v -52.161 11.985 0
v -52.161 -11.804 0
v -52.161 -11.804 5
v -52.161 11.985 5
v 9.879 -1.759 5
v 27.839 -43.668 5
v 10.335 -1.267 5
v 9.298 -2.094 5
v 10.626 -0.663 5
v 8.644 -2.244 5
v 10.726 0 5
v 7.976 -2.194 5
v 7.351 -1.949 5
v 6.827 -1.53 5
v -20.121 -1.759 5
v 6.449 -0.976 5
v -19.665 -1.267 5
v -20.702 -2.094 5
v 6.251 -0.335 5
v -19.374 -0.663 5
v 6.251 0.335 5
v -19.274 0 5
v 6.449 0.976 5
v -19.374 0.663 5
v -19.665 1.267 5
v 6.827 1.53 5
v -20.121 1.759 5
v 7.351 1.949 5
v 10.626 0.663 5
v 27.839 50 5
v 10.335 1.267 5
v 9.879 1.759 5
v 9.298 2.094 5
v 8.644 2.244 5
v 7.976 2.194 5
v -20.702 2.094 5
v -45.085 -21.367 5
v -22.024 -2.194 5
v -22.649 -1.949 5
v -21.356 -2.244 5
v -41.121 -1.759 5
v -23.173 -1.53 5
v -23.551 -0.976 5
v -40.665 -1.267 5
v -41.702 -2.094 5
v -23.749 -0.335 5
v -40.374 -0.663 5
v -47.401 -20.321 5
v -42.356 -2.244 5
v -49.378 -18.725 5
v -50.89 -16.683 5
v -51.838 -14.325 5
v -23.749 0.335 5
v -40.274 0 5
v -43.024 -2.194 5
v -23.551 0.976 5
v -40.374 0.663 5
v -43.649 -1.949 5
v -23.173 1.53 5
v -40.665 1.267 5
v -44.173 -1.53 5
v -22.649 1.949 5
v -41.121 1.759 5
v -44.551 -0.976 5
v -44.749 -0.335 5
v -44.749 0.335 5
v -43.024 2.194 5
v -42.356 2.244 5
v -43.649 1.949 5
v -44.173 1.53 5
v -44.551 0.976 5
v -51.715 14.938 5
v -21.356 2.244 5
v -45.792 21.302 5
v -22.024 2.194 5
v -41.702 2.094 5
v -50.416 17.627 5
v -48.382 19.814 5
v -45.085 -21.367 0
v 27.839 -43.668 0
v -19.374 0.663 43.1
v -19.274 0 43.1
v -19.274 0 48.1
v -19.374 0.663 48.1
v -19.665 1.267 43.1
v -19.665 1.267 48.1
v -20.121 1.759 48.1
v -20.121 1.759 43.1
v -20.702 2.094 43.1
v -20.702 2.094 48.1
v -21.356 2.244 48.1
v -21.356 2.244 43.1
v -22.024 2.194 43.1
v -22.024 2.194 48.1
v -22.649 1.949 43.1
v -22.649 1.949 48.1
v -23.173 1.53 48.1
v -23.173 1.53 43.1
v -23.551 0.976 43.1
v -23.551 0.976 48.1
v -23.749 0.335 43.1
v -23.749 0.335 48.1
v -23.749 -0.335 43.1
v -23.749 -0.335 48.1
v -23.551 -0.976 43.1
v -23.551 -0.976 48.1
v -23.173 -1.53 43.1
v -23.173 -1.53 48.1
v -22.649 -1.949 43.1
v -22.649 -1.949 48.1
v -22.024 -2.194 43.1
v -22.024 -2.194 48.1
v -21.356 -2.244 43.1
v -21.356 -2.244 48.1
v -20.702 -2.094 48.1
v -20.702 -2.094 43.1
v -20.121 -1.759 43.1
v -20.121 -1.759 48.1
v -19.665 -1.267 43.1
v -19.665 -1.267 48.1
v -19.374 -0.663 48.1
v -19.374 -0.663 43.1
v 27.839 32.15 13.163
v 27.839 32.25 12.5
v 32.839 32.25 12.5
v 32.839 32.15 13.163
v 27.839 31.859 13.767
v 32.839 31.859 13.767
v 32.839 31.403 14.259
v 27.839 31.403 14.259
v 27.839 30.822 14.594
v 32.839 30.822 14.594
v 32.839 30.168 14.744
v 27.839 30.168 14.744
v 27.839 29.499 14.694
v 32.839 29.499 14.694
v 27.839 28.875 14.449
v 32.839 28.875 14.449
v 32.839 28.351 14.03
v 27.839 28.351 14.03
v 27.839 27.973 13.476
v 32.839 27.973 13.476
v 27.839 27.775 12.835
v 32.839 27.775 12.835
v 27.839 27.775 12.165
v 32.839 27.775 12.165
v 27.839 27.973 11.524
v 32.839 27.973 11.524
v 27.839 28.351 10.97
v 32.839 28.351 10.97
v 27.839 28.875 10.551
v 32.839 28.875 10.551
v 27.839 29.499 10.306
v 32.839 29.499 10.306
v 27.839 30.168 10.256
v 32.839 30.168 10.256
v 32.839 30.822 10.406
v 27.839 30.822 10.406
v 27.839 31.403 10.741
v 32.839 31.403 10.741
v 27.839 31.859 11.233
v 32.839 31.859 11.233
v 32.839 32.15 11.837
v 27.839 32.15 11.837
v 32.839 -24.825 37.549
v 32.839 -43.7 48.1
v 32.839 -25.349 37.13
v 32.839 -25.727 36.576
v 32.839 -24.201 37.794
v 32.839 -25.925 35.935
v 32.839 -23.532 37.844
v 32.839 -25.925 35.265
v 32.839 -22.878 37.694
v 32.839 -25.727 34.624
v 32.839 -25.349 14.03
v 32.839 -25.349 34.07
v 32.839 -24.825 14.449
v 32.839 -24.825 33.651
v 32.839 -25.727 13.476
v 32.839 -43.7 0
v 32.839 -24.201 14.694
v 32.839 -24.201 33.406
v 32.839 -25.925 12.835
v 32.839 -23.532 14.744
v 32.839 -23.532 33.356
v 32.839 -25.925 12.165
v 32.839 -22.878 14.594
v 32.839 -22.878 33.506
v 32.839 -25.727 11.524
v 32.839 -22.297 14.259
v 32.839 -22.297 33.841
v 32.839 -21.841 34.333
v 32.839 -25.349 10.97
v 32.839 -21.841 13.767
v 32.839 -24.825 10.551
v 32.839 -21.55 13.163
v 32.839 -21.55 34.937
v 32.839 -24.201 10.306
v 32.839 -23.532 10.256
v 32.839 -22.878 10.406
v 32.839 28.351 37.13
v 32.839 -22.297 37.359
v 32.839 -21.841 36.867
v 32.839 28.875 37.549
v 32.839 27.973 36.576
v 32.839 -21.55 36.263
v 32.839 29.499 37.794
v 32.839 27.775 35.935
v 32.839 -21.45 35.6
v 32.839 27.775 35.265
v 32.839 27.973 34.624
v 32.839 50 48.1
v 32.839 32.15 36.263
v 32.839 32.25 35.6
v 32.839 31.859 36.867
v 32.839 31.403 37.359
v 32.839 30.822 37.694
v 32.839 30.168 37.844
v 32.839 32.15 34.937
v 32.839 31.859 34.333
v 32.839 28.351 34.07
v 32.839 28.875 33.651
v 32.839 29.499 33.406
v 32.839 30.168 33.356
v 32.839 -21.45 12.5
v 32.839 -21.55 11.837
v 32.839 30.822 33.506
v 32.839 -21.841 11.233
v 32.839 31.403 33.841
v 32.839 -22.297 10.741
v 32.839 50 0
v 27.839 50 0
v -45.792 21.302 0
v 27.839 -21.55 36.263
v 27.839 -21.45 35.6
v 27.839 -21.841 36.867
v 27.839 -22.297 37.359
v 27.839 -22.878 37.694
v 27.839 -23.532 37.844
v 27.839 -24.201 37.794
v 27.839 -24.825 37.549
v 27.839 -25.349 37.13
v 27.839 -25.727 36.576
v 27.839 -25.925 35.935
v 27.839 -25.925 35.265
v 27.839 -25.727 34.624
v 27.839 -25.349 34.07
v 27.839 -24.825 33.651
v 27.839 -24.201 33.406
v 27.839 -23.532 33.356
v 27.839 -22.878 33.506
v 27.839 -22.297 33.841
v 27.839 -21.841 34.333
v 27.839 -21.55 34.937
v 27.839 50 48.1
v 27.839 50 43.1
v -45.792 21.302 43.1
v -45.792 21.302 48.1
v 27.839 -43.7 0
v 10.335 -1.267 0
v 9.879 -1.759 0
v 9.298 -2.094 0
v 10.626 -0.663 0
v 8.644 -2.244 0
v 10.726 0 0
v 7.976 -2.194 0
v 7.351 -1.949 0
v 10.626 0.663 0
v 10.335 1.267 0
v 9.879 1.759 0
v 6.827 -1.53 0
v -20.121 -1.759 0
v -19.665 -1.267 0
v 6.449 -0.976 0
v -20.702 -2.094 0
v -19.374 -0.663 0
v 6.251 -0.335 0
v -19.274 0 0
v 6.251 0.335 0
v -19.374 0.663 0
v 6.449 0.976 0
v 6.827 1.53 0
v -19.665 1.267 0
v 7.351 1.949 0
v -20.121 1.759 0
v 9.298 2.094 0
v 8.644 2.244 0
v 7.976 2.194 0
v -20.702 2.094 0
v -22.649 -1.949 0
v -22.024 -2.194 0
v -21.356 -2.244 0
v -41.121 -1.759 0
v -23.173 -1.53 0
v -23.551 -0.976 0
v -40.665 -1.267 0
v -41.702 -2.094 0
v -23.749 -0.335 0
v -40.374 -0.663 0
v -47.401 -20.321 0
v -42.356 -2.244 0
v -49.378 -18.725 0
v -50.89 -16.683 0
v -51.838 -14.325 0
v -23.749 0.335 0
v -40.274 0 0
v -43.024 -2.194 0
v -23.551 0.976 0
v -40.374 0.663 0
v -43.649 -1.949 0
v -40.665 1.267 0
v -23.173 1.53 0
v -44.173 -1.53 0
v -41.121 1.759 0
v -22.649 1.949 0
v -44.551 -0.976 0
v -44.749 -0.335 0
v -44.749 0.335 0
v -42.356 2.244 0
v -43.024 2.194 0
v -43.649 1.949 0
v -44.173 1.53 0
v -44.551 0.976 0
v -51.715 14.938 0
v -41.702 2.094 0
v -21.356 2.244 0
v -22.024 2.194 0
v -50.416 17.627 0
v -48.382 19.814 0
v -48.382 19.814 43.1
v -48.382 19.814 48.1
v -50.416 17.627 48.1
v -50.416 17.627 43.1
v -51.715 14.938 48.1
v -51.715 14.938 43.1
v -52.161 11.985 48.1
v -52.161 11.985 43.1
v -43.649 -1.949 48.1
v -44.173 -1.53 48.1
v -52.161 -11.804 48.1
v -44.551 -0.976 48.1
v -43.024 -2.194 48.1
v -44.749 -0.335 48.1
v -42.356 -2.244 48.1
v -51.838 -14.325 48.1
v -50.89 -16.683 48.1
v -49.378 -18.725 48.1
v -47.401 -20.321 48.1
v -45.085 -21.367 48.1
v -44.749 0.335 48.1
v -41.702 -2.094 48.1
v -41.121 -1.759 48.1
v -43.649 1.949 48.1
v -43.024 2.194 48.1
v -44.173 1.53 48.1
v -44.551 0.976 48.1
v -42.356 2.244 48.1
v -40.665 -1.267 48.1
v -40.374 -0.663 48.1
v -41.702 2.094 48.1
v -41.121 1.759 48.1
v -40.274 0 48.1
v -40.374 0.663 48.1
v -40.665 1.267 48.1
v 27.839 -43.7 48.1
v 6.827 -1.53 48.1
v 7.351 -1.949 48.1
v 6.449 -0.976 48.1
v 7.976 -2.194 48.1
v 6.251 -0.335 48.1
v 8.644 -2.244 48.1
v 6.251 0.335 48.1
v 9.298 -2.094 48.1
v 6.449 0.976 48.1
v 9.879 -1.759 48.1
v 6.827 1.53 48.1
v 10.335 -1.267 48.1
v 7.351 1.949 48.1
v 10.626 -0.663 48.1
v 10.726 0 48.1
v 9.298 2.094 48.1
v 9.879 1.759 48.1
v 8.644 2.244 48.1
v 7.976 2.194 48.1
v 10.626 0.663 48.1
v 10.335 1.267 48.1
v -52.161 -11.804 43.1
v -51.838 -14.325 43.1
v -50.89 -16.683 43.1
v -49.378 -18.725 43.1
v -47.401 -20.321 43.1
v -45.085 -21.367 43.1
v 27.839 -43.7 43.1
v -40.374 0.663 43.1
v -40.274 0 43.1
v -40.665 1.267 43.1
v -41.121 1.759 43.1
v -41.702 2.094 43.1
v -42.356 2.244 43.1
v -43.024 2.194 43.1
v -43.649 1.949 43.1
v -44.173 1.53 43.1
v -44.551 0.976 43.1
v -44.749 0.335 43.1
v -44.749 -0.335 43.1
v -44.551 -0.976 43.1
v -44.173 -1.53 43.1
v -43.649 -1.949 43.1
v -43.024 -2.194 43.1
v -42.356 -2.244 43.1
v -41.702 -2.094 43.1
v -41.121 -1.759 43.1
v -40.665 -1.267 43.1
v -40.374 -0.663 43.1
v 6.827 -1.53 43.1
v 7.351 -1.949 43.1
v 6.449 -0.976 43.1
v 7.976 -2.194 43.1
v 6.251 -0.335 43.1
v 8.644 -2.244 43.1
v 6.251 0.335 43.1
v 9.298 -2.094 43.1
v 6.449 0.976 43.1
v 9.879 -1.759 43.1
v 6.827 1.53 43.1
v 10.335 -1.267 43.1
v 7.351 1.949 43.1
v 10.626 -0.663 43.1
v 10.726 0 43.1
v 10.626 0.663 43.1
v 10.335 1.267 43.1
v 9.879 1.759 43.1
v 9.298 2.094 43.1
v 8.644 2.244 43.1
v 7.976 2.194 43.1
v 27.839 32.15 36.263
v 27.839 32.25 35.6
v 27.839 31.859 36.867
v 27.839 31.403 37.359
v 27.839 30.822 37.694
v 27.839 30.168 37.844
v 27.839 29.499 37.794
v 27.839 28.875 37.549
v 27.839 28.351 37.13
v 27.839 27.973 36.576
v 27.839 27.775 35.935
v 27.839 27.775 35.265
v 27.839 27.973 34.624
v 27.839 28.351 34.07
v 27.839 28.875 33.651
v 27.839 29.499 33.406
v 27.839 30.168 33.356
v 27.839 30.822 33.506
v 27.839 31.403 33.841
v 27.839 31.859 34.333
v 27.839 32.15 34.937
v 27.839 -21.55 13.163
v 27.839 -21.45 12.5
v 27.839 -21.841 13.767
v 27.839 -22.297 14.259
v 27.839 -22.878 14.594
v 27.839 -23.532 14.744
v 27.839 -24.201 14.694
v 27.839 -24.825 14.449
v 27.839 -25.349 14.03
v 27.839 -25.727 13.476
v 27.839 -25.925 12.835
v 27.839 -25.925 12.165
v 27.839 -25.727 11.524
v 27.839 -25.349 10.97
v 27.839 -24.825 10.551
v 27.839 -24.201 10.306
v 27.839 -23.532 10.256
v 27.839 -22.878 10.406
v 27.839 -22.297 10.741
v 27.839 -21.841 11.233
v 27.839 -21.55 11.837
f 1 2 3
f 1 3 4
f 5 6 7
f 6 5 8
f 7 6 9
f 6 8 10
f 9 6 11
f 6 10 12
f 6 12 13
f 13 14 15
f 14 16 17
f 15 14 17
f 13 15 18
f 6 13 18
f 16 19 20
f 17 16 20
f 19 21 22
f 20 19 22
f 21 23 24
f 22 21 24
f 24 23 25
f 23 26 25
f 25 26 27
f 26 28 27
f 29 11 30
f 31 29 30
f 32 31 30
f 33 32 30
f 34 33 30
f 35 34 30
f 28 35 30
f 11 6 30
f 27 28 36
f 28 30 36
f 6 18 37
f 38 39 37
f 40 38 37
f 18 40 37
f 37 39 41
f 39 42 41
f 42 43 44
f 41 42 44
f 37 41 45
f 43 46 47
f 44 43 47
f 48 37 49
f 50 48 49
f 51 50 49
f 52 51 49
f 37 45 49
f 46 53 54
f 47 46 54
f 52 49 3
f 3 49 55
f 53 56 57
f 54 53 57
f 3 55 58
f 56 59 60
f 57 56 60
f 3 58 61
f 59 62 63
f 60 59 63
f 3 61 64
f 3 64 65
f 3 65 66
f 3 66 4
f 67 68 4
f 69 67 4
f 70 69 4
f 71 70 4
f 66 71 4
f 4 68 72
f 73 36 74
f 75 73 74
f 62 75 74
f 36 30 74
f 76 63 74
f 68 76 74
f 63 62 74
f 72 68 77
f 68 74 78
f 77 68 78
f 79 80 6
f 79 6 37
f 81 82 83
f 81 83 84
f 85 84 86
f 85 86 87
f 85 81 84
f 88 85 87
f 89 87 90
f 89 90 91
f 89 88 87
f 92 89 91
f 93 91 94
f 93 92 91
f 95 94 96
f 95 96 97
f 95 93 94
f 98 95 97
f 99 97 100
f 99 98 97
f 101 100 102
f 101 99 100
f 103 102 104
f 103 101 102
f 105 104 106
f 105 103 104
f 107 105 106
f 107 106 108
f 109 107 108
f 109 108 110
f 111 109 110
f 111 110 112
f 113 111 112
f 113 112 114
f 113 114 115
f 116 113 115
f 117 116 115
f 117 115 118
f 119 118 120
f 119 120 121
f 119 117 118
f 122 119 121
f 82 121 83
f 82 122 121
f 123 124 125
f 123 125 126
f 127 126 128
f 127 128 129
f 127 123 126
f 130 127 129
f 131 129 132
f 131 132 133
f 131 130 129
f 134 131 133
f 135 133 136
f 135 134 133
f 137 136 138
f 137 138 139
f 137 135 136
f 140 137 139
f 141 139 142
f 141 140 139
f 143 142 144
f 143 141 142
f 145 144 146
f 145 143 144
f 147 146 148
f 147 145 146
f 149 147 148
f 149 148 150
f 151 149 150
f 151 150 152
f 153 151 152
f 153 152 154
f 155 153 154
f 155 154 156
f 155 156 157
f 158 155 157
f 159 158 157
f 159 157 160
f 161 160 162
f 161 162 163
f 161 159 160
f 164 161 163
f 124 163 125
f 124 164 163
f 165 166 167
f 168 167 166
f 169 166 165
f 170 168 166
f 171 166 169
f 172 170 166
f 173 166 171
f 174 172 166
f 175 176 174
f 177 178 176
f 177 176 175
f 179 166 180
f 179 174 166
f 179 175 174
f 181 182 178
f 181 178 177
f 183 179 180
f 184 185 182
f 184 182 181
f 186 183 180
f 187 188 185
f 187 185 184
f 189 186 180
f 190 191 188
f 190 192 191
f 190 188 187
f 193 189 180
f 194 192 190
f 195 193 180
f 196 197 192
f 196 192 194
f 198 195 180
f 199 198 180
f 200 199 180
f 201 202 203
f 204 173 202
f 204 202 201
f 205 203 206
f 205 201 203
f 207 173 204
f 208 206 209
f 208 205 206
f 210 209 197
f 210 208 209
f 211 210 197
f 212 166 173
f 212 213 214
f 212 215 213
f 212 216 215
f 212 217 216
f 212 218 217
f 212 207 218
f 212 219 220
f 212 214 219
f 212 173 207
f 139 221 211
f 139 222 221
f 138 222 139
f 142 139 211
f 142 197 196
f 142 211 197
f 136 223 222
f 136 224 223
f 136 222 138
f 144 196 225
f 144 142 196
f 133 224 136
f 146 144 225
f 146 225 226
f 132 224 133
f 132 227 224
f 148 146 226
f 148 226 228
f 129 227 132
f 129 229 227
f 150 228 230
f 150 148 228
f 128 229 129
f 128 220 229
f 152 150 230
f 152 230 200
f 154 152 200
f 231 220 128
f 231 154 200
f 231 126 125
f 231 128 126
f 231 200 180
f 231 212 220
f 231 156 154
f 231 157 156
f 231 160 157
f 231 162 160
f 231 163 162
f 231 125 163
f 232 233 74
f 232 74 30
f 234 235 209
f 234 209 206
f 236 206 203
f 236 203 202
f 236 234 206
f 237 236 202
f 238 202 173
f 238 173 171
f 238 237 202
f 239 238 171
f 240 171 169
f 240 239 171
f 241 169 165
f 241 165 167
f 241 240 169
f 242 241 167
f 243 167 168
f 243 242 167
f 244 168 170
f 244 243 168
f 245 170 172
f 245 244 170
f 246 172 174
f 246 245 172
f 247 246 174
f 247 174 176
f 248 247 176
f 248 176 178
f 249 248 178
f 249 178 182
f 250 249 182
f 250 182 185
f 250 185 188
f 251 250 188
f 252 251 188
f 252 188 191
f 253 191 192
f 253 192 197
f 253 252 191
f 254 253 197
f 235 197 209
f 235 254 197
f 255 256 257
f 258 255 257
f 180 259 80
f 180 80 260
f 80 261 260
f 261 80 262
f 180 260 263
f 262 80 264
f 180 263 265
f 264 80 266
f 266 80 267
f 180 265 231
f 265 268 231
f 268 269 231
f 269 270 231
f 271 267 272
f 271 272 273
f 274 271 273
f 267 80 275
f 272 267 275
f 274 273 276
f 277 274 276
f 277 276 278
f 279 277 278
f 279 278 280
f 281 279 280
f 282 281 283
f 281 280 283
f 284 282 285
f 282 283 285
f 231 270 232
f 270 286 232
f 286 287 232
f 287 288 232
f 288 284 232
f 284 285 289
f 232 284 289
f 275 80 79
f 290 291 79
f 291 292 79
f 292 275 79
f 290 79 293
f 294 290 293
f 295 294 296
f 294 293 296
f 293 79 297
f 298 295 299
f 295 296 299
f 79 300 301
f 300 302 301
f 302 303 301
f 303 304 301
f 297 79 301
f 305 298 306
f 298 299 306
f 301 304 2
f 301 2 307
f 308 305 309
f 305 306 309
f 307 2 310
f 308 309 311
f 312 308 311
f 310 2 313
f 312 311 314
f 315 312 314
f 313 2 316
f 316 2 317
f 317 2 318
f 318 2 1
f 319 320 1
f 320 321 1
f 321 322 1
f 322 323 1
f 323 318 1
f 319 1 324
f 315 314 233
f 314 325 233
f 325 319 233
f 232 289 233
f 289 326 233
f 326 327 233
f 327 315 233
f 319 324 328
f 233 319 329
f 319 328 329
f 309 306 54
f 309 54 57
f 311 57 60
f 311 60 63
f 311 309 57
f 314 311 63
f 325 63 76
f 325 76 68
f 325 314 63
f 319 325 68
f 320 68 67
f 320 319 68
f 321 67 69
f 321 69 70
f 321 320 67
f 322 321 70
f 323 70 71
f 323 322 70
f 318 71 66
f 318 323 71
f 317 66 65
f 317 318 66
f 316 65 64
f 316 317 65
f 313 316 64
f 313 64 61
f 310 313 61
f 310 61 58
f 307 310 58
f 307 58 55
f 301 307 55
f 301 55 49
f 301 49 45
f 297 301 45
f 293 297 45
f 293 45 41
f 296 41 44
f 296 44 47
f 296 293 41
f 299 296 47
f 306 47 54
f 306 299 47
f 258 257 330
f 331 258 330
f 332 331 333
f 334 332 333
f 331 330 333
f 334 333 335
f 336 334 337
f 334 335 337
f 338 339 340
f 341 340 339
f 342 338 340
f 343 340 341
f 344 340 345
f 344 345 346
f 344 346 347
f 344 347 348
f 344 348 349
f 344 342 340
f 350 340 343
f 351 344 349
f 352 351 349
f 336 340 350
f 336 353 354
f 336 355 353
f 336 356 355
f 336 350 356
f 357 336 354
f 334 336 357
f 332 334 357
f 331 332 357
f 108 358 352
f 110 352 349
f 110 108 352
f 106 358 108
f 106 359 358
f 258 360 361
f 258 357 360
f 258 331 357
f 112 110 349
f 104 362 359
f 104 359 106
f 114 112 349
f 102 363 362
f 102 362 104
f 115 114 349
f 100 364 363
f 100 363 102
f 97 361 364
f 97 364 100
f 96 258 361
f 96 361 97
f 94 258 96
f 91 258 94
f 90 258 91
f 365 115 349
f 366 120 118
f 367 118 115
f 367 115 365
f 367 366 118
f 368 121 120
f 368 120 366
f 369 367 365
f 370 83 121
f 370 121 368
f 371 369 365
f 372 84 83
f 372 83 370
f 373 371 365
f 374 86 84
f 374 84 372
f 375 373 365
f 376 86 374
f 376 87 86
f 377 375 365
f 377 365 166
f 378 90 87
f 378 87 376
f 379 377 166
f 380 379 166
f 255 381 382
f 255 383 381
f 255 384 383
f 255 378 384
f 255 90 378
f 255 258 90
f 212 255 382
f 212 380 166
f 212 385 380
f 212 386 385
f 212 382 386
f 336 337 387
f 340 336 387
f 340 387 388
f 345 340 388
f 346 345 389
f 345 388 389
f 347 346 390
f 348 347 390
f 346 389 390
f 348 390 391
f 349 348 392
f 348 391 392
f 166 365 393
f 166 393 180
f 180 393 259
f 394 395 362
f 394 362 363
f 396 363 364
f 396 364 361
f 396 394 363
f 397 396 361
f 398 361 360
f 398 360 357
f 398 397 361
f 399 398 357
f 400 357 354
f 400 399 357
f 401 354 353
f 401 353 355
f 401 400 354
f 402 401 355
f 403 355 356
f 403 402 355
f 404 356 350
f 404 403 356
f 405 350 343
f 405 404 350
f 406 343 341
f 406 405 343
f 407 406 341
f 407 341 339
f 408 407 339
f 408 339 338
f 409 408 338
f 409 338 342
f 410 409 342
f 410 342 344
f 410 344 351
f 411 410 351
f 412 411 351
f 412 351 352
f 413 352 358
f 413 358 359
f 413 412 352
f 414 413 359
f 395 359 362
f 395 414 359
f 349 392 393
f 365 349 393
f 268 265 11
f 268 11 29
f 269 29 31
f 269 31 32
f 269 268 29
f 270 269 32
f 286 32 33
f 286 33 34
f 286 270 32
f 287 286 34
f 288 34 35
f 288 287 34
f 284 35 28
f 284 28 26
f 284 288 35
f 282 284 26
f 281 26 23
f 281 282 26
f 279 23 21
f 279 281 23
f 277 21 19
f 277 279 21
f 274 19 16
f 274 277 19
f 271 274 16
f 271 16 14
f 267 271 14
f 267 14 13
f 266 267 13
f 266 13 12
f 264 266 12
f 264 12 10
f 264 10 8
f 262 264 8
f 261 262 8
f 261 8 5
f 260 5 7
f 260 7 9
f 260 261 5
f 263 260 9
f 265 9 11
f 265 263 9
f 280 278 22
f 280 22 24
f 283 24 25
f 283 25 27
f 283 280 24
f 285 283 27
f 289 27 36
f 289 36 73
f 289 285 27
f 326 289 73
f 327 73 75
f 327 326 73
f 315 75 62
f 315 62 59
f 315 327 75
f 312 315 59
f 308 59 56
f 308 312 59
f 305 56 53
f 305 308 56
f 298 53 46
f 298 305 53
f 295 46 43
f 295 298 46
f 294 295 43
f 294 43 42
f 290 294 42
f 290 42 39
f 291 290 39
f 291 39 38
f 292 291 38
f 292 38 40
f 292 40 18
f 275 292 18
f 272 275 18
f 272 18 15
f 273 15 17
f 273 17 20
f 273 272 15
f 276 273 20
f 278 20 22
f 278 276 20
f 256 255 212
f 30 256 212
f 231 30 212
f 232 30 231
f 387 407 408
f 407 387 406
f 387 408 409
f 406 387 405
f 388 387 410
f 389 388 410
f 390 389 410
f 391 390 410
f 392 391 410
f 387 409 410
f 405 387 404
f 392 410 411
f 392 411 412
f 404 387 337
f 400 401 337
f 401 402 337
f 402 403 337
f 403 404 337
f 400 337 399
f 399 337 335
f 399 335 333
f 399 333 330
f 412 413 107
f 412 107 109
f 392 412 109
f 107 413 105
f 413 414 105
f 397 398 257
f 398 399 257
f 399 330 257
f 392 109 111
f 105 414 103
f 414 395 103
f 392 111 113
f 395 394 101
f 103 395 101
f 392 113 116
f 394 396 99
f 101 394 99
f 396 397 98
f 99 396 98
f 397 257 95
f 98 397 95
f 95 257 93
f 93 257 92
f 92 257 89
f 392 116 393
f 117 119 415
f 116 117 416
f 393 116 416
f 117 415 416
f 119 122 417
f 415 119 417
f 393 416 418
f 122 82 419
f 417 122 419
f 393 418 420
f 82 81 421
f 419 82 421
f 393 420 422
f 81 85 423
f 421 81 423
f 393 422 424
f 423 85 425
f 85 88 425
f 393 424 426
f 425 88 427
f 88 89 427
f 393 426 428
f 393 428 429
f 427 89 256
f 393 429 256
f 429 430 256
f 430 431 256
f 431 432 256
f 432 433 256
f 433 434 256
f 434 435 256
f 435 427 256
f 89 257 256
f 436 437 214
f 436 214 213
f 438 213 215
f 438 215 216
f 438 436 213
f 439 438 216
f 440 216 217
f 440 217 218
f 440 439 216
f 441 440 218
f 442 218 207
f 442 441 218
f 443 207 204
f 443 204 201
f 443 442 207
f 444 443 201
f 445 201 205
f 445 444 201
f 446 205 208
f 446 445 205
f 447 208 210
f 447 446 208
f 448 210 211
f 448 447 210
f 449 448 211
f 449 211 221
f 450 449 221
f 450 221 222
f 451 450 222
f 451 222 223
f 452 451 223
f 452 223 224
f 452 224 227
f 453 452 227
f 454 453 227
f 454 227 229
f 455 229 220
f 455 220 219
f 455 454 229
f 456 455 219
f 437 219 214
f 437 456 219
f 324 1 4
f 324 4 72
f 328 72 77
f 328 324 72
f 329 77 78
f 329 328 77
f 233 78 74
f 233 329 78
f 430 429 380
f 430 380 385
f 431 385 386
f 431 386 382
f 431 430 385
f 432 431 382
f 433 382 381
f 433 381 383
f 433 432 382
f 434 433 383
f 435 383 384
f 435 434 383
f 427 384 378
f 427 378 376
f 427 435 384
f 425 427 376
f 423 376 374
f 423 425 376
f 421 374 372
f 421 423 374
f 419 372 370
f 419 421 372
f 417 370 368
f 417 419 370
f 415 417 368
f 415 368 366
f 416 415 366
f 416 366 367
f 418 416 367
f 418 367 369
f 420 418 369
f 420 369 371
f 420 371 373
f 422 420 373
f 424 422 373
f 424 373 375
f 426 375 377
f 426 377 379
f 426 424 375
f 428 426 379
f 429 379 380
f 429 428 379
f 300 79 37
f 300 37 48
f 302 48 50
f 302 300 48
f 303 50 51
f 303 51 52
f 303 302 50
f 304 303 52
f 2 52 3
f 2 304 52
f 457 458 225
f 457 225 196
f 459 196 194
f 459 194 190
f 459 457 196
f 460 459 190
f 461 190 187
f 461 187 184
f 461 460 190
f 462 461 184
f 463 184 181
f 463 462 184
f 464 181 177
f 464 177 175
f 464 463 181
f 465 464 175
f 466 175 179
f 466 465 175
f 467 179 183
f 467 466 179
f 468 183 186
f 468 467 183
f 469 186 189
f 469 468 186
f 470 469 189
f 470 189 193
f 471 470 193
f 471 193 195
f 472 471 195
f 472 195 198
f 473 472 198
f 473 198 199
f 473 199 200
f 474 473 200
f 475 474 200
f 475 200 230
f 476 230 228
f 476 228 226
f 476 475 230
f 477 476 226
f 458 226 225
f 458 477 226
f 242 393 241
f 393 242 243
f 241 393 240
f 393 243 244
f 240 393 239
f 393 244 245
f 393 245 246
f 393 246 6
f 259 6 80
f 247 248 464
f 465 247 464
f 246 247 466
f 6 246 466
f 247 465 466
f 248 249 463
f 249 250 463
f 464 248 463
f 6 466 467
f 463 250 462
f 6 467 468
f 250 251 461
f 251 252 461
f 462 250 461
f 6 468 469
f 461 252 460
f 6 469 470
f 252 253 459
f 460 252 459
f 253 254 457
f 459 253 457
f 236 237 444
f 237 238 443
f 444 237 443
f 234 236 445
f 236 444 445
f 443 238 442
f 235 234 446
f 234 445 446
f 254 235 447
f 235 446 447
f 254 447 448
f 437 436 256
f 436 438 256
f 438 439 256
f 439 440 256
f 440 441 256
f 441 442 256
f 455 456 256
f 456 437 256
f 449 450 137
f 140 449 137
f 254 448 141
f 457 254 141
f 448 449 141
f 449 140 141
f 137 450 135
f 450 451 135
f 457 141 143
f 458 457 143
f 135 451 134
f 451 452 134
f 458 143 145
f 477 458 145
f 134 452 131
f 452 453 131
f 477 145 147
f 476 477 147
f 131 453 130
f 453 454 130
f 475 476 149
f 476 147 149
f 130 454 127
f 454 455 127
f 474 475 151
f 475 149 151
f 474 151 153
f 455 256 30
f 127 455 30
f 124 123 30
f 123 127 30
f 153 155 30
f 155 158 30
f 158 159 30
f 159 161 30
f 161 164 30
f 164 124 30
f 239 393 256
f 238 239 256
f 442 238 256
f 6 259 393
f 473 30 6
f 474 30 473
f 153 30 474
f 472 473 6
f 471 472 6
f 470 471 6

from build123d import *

# Parameters (mm, degrees)
SKETCH1_R           = 2.25
BOSS_EXTRUDE1_DEPTH = 5
SKETCH2_W           = 48.1
SKETCH2_H           = 93.7
SKETCH2_R           = 2.25
BOSS_EXTRUDE2_DEPTH = 5
BOSS_EXTRUDE3_START = -5
SKETCH3_R           = 2.25
BOSS_EXTRUDE3_DEPTH = 5


with BuildPart() as part:
    # Sketch1 → Boss-Extrude1 (new body)
    with BuildSketch(Plane.XY):
        with BuildLine():
            Line((-52.1605695, -11.804270746), (-52.1605695, 11.984503151))
            ThreePointArc((-52.1605695, 11.984503151), (-50.416314539, 17.627434468), (-45.792034729, 21.301823597))
            Line((-45.792034729, 21.301823597), (27.8394305, 50))
            Line((27.8394305, 50), (27.8394305, -43.667964744))
            Line((27.8394305, -43.667964744), (-45.084961564, -21.367111906))
            ThreePointArc((-45.084961564, -21.367111906), (-50.199348034, -17.752214901), (-52.1605695, -11.804270746))
        make_face()
        with Locations((-42.523814383, 0)):
            Circle(SKETCH1_R, mode=Mode.SUBTRACT)
        with Locations((-21.523814383, 0)):
            Circle(SKETCH1_R, mode=Mode.SUBTRACT)
        with Locations((8.476185617, 0)):
            Circle(SKETCH1_R, mode=Mode.SUBTRACT)
    extrude(amount=BOSS_EXTRUDE1_DEPTH)

    # Sketch2 → Boss-Extrude2 (add)
    with BuildSketch(Plane(origin=(27.8394305, 0, 0), x_dir=(0, 0, -1), z_dir=(1, 0, 0))):
        with Locations((-24.05, 3.15)):
            Rectangle(SKETCH2_W, SKETCH2_H)
        with Locations(Location((-35.6, 30, 0), (0, 0, 90))):
            Circle(SKETCH2_R, mode=Mode.SUBTRACT)
        with Locations(Location((-12.5, 30, 0), (0, 0, 90))):
            Circle(SKETCH2_R, mode=Mode.SUBTRACT)
        with Locations(Location((-35.6, -23.7, 0), (0, 0, 90))):
            Circle(SKETCH2_R, mode=Mode.SUBTRACT)
        with Locations(Location((-12.5, -23.7, 0), (0, 0, 90))):
            Circle(SKETCH2_R, mode=Mode.SUBTRACT)
    extrude(amount=BOSS_EXTRUDE2_DEPTH)

    # Sketch3 → Boss-Extrude3 (add)
    with BuildSketch(Plane.XY.offset(48.1).offset(BOSS_EXTRUDE3_START)):
        with BuildLine():
            Line((27.8394305, 50), (-45.792034729, 21.301823597))
            ThreePointArc((-45.792034729, 21.301823597), (-50.416314539, 17.627434468), (-52.1605695, 11.984503151))
            Line((-52.1605695, 11.984503151), (-52.1605695, -11.804270746))
            ThreePointArc((-52.1605695, -11.804270746), (-50.199348034, -17.752214901), (-45.084961564, -21.367111906))
            Line((-45.084961564, -21.367111906), (27.8394305, -43.7))
            Line((27.8394305, -43.7), (27.8394305, 50))
        make_face()
        with Locations((-21.523814383, 0)):
            Circle(SKETCH3_R, mode=Mode.SUBTRACT)
        with Locations((-42.523814383, 0)):
            Circle(SKETCH3_R, mode=Mode.SUBTRACT)
        with Locations((8.476185617, 0)):
            Circle(SKETCH3_R, mode=Mode.SUBTRACT)
    extrude(amount=BOSS_EXTRUDE3_DEPTH)


solid = part.part
